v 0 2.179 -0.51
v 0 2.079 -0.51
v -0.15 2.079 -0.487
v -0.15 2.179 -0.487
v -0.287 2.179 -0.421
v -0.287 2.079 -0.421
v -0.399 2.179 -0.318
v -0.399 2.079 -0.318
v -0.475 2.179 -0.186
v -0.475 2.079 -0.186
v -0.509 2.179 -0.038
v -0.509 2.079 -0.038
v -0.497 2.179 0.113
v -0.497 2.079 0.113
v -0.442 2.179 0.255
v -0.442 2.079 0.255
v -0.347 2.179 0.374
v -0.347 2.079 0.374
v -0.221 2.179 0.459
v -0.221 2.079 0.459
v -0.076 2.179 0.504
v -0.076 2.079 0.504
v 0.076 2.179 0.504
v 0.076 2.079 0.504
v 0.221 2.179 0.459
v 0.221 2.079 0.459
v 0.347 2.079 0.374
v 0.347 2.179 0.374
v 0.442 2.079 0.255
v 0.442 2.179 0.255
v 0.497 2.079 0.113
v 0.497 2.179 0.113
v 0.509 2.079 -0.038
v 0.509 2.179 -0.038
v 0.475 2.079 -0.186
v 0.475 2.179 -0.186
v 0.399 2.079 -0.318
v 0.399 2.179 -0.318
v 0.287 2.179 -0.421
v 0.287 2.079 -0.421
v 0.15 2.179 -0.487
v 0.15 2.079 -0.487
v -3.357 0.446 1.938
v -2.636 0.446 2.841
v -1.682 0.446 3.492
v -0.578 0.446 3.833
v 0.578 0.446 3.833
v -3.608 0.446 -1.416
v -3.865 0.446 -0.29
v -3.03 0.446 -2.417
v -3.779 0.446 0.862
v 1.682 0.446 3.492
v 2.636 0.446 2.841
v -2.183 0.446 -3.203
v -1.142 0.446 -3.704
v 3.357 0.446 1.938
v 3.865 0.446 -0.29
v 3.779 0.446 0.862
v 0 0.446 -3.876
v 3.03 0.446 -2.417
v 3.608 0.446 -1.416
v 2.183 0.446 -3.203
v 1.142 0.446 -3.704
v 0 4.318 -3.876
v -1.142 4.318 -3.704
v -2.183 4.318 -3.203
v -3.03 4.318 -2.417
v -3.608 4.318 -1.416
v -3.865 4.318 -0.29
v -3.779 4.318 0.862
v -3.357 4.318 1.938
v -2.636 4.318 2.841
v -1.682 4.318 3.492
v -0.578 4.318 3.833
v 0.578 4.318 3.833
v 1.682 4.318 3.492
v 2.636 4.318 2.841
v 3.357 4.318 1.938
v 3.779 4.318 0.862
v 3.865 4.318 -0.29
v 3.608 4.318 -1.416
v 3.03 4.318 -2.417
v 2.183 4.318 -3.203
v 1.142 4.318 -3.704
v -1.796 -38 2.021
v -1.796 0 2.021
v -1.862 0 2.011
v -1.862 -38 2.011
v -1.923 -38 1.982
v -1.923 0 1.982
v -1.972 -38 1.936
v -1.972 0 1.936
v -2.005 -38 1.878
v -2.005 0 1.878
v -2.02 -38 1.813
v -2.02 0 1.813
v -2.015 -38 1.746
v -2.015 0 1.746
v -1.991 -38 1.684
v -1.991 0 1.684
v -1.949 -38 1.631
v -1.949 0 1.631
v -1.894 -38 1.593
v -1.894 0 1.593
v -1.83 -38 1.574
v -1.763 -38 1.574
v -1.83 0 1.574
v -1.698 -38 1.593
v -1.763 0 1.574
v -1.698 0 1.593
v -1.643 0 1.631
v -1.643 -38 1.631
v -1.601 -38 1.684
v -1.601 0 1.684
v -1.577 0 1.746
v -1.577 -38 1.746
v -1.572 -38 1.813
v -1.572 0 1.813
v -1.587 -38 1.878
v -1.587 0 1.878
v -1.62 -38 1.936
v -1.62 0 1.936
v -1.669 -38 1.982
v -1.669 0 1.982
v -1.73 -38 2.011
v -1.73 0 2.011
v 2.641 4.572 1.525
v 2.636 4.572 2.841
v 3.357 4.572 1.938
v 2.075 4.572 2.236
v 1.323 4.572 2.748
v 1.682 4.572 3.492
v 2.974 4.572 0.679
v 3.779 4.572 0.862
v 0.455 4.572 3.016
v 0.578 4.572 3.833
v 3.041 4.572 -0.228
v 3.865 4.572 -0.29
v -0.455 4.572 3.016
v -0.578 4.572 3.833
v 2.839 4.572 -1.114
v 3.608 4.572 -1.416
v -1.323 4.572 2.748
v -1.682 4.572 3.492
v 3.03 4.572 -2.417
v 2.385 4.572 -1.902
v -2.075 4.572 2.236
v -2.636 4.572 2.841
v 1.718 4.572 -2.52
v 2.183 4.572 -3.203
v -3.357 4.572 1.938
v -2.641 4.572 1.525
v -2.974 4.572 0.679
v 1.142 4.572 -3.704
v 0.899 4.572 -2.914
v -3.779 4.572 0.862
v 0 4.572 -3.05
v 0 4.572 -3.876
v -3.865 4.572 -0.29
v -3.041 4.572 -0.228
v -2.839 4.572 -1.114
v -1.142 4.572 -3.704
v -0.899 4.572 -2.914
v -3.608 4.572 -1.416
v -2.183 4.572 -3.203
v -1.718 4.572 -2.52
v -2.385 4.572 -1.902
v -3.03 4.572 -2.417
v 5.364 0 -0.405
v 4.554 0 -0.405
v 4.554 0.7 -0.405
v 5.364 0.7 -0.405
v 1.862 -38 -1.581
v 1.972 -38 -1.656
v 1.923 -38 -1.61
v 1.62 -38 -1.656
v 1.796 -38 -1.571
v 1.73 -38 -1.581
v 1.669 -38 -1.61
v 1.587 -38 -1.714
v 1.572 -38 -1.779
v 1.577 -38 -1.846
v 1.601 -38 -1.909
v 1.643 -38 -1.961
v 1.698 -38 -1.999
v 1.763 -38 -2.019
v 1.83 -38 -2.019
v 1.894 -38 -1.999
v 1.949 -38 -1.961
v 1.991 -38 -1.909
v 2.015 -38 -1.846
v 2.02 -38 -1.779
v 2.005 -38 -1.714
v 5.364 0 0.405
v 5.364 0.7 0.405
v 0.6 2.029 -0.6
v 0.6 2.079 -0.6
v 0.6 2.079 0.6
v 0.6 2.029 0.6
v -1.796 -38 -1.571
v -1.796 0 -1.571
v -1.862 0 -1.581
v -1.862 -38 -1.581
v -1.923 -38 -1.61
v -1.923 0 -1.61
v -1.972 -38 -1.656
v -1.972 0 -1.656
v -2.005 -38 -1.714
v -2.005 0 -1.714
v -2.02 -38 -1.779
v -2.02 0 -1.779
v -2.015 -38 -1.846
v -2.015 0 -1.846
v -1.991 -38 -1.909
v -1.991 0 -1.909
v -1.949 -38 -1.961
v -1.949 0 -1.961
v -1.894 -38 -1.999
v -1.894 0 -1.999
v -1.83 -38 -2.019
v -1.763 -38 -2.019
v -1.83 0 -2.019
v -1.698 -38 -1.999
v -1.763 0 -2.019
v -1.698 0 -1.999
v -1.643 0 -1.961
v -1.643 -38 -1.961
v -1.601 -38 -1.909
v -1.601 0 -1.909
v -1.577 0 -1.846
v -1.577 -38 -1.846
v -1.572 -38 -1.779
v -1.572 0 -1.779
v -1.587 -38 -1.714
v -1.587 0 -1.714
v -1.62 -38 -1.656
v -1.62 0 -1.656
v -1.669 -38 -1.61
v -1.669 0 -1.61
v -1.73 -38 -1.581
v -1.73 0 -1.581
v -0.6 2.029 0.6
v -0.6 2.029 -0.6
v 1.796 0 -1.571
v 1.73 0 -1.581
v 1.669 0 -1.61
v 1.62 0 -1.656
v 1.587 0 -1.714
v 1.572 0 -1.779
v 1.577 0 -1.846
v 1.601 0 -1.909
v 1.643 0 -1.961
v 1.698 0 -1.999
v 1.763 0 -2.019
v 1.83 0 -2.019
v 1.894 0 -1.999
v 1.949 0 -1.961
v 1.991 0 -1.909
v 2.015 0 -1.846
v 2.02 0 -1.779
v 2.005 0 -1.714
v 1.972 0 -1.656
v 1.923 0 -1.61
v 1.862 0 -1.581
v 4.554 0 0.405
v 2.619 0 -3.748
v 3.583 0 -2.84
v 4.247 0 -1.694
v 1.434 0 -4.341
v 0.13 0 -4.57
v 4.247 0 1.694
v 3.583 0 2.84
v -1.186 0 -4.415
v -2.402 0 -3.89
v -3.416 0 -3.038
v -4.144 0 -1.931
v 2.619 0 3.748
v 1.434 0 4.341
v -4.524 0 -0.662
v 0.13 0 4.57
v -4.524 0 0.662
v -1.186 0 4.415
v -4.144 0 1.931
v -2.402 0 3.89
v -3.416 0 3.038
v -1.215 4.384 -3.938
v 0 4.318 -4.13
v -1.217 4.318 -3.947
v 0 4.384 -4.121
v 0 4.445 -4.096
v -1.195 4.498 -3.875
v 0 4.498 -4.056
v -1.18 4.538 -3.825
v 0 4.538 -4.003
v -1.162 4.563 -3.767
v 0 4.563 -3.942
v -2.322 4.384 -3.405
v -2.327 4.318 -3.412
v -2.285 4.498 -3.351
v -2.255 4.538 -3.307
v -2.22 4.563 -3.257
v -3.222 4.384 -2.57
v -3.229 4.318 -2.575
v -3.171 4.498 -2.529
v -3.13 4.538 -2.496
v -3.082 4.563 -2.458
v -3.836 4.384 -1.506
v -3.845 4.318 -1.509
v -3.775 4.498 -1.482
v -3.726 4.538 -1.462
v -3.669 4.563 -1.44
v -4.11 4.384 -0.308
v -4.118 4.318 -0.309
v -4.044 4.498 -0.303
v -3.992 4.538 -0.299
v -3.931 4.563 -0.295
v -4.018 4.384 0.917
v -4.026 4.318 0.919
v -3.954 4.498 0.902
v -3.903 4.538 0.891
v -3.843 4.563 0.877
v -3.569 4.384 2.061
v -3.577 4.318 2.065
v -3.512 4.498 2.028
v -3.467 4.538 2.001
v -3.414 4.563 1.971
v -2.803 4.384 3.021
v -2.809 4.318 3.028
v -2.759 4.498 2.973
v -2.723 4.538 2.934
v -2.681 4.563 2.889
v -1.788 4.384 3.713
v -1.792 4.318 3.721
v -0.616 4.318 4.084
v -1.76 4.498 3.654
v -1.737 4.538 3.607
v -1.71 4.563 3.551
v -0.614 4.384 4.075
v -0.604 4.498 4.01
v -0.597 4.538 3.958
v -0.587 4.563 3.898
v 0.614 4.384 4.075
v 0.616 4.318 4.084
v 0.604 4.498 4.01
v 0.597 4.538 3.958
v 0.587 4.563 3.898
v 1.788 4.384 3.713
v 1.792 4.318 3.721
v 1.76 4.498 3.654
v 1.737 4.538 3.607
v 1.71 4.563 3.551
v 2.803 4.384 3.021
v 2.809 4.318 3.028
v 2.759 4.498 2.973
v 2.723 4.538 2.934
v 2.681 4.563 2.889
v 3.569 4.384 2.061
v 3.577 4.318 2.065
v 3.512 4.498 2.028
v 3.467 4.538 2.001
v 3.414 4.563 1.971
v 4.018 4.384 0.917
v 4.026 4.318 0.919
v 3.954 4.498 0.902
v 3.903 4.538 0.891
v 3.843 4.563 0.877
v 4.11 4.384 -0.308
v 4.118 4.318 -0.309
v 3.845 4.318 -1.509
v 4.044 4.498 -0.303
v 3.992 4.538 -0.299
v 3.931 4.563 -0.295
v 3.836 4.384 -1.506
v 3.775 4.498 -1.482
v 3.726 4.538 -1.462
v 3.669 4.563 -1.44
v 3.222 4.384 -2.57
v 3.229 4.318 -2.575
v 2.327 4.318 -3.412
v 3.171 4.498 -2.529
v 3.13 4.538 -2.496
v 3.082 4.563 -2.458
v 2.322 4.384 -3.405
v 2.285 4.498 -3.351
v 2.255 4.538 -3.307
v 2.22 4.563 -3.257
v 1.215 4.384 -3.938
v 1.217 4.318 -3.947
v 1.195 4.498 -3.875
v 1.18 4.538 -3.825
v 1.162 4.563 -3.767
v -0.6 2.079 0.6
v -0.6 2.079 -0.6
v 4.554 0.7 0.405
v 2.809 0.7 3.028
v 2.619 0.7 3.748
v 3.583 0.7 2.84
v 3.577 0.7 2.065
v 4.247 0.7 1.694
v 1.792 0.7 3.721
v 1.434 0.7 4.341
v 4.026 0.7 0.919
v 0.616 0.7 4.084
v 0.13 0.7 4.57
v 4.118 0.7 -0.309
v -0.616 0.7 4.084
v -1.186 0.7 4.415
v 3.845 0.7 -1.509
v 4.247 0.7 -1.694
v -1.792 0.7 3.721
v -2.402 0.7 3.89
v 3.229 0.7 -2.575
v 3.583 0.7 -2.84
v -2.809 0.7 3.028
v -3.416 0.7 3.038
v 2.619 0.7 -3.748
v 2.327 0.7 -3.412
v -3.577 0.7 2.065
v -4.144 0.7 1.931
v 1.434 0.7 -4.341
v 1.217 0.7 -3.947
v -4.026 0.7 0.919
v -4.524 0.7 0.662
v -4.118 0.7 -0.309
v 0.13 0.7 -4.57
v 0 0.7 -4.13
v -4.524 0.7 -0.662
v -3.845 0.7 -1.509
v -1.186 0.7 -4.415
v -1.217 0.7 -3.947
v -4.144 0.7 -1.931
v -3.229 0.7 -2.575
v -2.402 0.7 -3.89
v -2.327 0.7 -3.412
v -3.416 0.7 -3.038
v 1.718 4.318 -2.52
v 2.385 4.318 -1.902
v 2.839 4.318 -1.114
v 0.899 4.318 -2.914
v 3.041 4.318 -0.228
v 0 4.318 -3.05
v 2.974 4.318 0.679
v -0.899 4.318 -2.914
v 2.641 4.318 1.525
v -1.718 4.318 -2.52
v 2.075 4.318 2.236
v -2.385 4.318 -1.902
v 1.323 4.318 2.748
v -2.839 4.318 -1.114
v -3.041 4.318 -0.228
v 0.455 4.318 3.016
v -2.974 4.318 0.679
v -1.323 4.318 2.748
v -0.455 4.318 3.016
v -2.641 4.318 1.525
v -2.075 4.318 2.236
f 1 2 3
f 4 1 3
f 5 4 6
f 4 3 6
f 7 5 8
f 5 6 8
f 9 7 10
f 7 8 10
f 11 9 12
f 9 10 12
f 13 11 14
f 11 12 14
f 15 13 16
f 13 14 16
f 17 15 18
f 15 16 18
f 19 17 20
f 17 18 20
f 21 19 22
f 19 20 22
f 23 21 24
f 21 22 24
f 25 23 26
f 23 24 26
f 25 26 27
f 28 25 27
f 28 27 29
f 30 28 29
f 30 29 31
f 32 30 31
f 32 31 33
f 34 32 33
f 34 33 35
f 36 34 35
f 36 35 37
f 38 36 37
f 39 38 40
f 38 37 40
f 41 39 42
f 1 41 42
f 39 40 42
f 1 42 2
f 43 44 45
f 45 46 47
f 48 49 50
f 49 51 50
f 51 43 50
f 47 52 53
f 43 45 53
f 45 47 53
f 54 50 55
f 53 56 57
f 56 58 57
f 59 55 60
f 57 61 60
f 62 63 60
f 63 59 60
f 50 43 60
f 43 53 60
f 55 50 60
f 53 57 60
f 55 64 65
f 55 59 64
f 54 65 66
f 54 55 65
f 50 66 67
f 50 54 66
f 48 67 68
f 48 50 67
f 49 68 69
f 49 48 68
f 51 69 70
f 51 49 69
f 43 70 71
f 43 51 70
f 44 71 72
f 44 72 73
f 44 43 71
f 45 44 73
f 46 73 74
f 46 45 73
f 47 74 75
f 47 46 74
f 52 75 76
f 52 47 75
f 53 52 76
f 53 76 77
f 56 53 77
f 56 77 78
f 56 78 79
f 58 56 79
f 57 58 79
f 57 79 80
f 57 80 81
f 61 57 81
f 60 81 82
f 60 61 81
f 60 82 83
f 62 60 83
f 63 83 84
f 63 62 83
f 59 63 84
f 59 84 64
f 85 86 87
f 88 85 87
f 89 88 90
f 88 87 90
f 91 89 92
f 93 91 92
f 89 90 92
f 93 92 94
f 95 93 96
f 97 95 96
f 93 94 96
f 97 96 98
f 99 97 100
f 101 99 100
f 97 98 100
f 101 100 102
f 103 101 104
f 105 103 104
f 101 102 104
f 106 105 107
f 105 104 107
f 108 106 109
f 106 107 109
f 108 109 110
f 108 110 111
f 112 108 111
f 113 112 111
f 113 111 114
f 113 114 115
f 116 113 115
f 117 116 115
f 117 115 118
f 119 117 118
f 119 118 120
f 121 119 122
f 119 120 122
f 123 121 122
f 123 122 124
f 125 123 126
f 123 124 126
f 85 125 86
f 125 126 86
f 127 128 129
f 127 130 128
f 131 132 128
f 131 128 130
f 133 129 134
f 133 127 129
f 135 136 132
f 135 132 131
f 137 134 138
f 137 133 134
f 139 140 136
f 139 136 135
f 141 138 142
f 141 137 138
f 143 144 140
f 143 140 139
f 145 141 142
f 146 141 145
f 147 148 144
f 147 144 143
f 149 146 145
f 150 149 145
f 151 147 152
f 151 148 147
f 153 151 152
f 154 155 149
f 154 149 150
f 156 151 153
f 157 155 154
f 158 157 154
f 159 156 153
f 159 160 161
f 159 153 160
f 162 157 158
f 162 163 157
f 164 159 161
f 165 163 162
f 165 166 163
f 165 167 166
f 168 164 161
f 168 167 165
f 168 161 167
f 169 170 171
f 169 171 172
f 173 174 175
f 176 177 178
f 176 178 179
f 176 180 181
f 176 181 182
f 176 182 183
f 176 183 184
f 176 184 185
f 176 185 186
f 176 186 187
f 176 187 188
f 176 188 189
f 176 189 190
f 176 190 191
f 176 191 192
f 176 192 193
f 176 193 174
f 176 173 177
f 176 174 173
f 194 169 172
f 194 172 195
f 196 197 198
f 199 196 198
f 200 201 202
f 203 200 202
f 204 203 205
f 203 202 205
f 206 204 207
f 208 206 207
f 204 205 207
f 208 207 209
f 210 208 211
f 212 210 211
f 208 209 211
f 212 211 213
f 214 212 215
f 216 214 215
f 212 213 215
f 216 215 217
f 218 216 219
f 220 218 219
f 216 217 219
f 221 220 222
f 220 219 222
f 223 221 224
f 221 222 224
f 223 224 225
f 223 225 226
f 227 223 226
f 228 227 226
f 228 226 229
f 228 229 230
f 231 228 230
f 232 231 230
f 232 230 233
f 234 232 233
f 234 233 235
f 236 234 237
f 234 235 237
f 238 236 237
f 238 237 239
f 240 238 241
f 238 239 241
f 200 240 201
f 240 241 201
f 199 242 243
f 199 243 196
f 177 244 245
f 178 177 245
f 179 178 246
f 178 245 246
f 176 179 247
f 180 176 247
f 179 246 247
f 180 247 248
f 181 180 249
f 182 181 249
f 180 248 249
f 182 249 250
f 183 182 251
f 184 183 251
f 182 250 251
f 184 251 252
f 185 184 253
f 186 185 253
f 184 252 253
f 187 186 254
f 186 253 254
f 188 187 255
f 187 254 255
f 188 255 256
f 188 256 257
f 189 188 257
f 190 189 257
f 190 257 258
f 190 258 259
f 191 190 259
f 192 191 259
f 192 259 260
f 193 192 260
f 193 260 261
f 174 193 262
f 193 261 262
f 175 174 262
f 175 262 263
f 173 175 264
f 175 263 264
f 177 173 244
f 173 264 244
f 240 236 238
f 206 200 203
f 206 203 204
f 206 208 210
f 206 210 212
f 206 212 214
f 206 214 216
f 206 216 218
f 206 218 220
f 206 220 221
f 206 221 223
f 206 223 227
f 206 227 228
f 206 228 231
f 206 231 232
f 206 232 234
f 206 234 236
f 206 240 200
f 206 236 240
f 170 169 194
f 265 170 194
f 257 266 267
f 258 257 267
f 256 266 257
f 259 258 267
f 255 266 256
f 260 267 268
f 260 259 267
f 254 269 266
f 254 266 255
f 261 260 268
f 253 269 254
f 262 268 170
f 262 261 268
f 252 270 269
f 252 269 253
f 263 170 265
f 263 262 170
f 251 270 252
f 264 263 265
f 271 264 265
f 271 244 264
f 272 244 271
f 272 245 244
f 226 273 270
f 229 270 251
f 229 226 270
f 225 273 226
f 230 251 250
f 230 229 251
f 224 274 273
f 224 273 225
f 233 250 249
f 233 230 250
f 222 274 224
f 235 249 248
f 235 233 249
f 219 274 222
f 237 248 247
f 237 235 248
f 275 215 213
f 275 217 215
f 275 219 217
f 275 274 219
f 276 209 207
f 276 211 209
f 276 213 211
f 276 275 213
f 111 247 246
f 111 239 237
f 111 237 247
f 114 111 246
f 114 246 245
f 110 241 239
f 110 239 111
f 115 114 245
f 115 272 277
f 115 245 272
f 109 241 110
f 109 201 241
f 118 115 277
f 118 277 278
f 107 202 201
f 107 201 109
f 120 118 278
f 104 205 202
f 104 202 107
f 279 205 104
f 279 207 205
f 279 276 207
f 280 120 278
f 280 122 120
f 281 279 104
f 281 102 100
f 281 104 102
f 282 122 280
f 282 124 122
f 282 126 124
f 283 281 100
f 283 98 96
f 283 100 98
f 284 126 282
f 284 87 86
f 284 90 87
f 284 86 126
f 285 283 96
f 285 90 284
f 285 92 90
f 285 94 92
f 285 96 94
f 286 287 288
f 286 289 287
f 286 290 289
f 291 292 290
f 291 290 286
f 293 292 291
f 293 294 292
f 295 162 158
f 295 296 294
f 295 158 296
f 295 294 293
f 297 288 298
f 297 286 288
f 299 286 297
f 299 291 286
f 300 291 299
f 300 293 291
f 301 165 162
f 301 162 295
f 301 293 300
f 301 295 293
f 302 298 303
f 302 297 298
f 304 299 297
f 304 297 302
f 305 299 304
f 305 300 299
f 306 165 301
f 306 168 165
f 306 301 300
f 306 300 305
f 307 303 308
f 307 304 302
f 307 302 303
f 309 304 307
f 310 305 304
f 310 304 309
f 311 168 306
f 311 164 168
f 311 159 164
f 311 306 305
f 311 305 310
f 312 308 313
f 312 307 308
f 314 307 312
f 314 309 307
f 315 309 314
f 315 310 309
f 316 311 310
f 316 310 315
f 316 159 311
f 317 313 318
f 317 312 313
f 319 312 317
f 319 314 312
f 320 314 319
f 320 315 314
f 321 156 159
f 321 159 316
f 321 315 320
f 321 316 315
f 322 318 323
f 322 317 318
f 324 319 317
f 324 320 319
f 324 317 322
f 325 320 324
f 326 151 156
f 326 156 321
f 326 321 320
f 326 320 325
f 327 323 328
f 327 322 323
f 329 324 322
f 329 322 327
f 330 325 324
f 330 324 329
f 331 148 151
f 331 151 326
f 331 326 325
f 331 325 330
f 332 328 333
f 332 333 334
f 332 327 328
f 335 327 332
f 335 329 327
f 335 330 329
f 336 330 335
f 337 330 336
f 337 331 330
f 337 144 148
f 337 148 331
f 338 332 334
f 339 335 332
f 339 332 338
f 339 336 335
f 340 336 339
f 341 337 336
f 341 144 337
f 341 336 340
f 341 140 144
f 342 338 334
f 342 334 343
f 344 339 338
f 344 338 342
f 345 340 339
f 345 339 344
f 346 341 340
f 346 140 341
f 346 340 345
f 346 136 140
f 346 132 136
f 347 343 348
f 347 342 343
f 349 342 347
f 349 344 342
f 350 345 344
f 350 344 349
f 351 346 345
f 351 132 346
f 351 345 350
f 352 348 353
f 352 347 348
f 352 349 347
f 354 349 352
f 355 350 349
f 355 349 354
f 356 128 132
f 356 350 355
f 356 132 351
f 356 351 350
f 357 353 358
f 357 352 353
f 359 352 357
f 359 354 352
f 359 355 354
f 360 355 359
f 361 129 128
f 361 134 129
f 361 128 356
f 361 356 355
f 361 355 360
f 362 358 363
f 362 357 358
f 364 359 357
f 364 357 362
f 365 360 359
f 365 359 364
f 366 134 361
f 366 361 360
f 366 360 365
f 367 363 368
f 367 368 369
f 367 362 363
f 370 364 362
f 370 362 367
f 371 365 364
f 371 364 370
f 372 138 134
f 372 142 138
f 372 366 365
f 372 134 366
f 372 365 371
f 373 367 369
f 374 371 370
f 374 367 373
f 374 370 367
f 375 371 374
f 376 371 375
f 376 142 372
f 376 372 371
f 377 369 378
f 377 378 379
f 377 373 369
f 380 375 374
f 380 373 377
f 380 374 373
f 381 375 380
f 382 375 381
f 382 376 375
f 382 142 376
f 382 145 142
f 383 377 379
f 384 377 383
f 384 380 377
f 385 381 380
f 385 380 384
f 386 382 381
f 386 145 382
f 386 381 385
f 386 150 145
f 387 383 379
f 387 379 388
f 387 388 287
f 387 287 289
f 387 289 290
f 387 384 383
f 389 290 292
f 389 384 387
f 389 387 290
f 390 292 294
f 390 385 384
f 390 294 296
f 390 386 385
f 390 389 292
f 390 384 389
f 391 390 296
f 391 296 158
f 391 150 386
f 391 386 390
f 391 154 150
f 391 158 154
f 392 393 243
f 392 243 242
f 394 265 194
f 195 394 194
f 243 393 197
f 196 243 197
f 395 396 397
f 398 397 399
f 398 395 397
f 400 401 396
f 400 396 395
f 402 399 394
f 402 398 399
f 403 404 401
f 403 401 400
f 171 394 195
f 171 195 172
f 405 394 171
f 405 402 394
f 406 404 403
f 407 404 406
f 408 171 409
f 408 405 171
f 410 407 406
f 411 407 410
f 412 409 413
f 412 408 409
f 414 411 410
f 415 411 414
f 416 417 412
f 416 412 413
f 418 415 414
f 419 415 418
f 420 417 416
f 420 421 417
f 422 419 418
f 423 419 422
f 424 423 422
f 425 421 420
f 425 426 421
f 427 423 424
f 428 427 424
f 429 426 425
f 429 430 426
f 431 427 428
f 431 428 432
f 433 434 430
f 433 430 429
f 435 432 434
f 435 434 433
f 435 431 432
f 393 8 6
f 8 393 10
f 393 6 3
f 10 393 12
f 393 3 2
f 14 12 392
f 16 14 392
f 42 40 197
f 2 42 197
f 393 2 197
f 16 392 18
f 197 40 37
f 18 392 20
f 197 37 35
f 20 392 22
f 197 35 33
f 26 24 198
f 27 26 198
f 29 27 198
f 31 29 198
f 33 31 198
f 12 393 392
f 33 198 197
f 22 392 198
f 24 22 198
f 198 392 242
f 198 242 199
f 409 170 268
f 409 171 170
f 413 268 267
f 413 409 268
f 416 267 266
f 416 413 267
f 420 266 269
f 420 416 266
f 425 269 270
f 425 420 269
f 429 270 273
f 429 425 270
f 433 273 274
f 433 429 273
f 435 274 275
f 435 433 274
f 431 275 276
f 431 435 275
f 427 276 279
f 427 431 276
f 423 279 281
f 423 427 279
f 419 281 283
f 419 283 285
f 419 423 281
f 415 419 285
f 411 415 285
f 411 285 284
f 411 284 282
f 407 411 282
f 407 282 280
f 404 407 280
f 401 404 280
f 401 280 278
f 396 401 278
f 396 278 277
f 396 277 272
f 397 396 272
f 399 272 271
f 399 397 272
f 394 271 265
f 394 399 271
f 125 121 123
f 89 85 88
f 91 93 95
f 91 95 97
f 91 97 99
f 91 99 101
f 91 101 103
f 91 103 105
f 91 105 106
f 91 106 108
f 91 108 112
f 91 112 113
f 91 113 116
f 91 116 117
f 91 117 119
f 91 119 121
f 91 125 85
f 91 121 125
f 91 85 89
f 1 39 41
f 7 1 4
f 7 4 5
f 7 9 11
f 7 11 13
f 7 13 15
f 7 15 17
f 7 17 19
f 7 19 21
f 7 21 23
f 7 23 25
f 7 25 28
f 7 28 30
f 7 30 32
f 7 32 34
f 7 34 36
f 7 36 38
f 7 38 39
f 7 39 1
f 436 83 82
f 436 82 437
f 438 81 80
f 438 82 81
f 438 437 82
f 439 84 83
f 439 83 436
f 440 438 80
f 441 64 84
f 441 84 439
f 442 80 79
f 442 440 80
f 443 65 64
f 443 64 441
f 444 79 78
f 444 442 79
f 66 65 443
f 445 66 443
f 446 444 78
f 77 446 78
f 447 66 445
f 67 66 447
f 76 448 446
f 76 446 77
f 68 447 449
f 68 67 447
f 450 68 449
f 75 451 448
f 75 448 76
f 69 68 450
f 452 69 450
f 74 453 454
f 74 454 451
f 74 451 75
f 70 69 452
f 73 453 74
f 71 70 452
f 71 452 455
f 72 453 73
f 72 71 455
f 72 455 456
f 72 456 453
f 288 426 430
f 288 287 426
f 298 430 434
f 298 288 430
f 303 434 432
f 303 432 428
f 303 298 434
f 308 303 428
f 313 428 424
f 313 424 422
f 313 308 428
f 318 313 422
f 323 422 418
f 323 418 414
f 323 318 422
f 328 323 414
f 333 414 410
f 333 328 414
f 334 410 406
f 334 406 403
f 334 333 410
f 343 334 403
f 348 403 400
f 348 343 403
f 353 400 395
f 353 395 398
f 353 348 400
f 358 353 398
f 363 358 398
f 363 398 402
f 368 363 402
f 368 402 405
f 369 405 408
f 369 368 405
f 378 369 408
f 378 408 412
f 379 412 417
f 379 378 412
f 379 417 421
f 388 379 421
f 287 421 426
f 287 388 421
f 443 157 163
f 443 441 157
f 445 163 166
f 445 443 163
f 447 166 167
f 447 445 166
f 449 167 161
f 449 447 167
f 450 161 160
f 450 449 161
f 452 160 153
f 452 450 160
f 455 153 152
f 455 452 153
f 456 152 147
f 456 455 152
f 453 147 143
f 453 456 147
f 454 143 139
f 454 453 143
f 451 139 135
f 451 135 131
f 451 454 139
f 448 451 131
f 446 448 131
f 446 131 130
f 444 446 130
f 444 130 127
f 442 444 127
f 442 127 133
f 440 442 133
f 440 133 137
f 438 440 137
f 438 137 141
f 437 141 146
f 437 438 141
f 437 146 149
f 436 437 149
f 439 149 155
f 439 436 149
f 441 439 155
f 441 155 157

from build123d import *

# Parameters (mm, degrees)
SKETCH2_R           = 4.572
BOSS_EXTRUDE1_DEPTH = 0.446
BOSS_EXTRUDE2_START = -2.0792
SKETCH3_W           = 1.2
SKETCH3_H           = 1.2
BOSS_EXTRUDE2_DEPTH = 0.05
SKETCH8_R           = 0.51
BOSS_EXTRUDE6_DEPTH = 0.1
SKETCH5_R           = 0.225
BOSS_EXTRUDE4_DEPTH = 38
SKETCH10_W          = 0.81
SKETCH10_H          = 0.81
BOSS_EXTRUDE7_DEPTH = 0.7


with BuildPart() as part:
    # Sketch1 → Revolve-Thin2 (revolve)
    with BuildSketch(Plane.XY, mode=Mode.PRIVATE) as revolve_thin2_sk:
        with BuildLine():
            Line((4.572, 0), (4.572, 0.7))
            Line((4.572, 0.7), (4.13, 0.7))
            Line((4.13, 0.7), (4.13, 4.318))
            ThreePointArc((4.13, 4.318), (4.055605122, 4.497605122), (3.876, 4.572))
            Line((3.876, 4.572), (3.05, 4.572))
            Line((3.05, 4.572), (3.05, 4.318))
            Line((3.05, 4.318), (3.876, 4.318))
            Line((3.876, 4.318), (3.876, 0.446))
            Line((3.876, 0.446), (4.318, 0.446))
            Line((4.318, 0.446), (4.318, 0))
            Line((4.318, 0), (4.572, 0))
        make_face()
    revolve(revolve_thin2_sk.sketch.rotate(Axis((0, 0, 0), (0, 1, 0)), 90), axis=Axis((0, 0, 0), (0, 1, 0)))  # turned: the seam where the file's is

    # Sketch2 → Boss-Extrude1 (add)
    with BuildSketch(Plane.XZ):
        with Locations(Location((0, 0, 0), (0, 0, 270))):  # turned: the seam where the file's is
            Circle(SKETCH2_R)
    extrude(amount=-BOSS_EXTRUDE1_DEPTH)

    # Sketch5 → Boss-Extrude4 (add)
    with BuildSketch(Plane.XZ):
        with Locations(Location((-1.796051224, -1.796051224, 0), (0, 0, 90))):  # turned: the seam where the file's is
            Circle(SKETCH5_R)
        with Locations(Location((1.796051224, -1.796051224, 0), (0, 0, 90))):  # turned: the seam where the file's is
            Circle(SKETCH5_R)
        with Locations(Location((-1.796051224, 1.796051224, 0), (0, 0, 90))):  # turned: the seam where the file's is
            Circle(SKETCH5_R)
    extrude(amount=BOSS_EXTRUDE4_DEPTH)

    # Sketch10 → Boss-Extrude7 (add)
    with BuildSketch(Plane.XZ):
        with Locations((4.95902668, 0)):
            Rectangle(SKETCH10_W, SKETCH10_H)
    extrude(amount=-BOSS_EXTRUDE7_DEPTH)


with BuildPart() as body_2:
    # Sketch3 → Boss-Extrude2 (new body)
    with BuildSketch(Plane.XZ.offset(BOSS_EXTRUDE2_START)):
        Rectangle(SKETCH3_W, SKETCH3_H)
    extrude(amount=BOSS_EXTRUDE2_DEPTH)

    # Sketch8 → Boss-Extrude6 (add)
    with BuildSketch(Plane(origin=(0, 2.0792, 0), x_dir=(-1, 0, 0), z_dir=(0, 1, 0))):
        with Locations(Location((0, 0, 0), (0, 0, 270))):  # turned: the seam where the file's is
            Circle(SKETCH8_R)
    extrude(amount=BOSS_EXTRUDE6_DEPTH)


solid = Compound([part.part, body_2.part])
